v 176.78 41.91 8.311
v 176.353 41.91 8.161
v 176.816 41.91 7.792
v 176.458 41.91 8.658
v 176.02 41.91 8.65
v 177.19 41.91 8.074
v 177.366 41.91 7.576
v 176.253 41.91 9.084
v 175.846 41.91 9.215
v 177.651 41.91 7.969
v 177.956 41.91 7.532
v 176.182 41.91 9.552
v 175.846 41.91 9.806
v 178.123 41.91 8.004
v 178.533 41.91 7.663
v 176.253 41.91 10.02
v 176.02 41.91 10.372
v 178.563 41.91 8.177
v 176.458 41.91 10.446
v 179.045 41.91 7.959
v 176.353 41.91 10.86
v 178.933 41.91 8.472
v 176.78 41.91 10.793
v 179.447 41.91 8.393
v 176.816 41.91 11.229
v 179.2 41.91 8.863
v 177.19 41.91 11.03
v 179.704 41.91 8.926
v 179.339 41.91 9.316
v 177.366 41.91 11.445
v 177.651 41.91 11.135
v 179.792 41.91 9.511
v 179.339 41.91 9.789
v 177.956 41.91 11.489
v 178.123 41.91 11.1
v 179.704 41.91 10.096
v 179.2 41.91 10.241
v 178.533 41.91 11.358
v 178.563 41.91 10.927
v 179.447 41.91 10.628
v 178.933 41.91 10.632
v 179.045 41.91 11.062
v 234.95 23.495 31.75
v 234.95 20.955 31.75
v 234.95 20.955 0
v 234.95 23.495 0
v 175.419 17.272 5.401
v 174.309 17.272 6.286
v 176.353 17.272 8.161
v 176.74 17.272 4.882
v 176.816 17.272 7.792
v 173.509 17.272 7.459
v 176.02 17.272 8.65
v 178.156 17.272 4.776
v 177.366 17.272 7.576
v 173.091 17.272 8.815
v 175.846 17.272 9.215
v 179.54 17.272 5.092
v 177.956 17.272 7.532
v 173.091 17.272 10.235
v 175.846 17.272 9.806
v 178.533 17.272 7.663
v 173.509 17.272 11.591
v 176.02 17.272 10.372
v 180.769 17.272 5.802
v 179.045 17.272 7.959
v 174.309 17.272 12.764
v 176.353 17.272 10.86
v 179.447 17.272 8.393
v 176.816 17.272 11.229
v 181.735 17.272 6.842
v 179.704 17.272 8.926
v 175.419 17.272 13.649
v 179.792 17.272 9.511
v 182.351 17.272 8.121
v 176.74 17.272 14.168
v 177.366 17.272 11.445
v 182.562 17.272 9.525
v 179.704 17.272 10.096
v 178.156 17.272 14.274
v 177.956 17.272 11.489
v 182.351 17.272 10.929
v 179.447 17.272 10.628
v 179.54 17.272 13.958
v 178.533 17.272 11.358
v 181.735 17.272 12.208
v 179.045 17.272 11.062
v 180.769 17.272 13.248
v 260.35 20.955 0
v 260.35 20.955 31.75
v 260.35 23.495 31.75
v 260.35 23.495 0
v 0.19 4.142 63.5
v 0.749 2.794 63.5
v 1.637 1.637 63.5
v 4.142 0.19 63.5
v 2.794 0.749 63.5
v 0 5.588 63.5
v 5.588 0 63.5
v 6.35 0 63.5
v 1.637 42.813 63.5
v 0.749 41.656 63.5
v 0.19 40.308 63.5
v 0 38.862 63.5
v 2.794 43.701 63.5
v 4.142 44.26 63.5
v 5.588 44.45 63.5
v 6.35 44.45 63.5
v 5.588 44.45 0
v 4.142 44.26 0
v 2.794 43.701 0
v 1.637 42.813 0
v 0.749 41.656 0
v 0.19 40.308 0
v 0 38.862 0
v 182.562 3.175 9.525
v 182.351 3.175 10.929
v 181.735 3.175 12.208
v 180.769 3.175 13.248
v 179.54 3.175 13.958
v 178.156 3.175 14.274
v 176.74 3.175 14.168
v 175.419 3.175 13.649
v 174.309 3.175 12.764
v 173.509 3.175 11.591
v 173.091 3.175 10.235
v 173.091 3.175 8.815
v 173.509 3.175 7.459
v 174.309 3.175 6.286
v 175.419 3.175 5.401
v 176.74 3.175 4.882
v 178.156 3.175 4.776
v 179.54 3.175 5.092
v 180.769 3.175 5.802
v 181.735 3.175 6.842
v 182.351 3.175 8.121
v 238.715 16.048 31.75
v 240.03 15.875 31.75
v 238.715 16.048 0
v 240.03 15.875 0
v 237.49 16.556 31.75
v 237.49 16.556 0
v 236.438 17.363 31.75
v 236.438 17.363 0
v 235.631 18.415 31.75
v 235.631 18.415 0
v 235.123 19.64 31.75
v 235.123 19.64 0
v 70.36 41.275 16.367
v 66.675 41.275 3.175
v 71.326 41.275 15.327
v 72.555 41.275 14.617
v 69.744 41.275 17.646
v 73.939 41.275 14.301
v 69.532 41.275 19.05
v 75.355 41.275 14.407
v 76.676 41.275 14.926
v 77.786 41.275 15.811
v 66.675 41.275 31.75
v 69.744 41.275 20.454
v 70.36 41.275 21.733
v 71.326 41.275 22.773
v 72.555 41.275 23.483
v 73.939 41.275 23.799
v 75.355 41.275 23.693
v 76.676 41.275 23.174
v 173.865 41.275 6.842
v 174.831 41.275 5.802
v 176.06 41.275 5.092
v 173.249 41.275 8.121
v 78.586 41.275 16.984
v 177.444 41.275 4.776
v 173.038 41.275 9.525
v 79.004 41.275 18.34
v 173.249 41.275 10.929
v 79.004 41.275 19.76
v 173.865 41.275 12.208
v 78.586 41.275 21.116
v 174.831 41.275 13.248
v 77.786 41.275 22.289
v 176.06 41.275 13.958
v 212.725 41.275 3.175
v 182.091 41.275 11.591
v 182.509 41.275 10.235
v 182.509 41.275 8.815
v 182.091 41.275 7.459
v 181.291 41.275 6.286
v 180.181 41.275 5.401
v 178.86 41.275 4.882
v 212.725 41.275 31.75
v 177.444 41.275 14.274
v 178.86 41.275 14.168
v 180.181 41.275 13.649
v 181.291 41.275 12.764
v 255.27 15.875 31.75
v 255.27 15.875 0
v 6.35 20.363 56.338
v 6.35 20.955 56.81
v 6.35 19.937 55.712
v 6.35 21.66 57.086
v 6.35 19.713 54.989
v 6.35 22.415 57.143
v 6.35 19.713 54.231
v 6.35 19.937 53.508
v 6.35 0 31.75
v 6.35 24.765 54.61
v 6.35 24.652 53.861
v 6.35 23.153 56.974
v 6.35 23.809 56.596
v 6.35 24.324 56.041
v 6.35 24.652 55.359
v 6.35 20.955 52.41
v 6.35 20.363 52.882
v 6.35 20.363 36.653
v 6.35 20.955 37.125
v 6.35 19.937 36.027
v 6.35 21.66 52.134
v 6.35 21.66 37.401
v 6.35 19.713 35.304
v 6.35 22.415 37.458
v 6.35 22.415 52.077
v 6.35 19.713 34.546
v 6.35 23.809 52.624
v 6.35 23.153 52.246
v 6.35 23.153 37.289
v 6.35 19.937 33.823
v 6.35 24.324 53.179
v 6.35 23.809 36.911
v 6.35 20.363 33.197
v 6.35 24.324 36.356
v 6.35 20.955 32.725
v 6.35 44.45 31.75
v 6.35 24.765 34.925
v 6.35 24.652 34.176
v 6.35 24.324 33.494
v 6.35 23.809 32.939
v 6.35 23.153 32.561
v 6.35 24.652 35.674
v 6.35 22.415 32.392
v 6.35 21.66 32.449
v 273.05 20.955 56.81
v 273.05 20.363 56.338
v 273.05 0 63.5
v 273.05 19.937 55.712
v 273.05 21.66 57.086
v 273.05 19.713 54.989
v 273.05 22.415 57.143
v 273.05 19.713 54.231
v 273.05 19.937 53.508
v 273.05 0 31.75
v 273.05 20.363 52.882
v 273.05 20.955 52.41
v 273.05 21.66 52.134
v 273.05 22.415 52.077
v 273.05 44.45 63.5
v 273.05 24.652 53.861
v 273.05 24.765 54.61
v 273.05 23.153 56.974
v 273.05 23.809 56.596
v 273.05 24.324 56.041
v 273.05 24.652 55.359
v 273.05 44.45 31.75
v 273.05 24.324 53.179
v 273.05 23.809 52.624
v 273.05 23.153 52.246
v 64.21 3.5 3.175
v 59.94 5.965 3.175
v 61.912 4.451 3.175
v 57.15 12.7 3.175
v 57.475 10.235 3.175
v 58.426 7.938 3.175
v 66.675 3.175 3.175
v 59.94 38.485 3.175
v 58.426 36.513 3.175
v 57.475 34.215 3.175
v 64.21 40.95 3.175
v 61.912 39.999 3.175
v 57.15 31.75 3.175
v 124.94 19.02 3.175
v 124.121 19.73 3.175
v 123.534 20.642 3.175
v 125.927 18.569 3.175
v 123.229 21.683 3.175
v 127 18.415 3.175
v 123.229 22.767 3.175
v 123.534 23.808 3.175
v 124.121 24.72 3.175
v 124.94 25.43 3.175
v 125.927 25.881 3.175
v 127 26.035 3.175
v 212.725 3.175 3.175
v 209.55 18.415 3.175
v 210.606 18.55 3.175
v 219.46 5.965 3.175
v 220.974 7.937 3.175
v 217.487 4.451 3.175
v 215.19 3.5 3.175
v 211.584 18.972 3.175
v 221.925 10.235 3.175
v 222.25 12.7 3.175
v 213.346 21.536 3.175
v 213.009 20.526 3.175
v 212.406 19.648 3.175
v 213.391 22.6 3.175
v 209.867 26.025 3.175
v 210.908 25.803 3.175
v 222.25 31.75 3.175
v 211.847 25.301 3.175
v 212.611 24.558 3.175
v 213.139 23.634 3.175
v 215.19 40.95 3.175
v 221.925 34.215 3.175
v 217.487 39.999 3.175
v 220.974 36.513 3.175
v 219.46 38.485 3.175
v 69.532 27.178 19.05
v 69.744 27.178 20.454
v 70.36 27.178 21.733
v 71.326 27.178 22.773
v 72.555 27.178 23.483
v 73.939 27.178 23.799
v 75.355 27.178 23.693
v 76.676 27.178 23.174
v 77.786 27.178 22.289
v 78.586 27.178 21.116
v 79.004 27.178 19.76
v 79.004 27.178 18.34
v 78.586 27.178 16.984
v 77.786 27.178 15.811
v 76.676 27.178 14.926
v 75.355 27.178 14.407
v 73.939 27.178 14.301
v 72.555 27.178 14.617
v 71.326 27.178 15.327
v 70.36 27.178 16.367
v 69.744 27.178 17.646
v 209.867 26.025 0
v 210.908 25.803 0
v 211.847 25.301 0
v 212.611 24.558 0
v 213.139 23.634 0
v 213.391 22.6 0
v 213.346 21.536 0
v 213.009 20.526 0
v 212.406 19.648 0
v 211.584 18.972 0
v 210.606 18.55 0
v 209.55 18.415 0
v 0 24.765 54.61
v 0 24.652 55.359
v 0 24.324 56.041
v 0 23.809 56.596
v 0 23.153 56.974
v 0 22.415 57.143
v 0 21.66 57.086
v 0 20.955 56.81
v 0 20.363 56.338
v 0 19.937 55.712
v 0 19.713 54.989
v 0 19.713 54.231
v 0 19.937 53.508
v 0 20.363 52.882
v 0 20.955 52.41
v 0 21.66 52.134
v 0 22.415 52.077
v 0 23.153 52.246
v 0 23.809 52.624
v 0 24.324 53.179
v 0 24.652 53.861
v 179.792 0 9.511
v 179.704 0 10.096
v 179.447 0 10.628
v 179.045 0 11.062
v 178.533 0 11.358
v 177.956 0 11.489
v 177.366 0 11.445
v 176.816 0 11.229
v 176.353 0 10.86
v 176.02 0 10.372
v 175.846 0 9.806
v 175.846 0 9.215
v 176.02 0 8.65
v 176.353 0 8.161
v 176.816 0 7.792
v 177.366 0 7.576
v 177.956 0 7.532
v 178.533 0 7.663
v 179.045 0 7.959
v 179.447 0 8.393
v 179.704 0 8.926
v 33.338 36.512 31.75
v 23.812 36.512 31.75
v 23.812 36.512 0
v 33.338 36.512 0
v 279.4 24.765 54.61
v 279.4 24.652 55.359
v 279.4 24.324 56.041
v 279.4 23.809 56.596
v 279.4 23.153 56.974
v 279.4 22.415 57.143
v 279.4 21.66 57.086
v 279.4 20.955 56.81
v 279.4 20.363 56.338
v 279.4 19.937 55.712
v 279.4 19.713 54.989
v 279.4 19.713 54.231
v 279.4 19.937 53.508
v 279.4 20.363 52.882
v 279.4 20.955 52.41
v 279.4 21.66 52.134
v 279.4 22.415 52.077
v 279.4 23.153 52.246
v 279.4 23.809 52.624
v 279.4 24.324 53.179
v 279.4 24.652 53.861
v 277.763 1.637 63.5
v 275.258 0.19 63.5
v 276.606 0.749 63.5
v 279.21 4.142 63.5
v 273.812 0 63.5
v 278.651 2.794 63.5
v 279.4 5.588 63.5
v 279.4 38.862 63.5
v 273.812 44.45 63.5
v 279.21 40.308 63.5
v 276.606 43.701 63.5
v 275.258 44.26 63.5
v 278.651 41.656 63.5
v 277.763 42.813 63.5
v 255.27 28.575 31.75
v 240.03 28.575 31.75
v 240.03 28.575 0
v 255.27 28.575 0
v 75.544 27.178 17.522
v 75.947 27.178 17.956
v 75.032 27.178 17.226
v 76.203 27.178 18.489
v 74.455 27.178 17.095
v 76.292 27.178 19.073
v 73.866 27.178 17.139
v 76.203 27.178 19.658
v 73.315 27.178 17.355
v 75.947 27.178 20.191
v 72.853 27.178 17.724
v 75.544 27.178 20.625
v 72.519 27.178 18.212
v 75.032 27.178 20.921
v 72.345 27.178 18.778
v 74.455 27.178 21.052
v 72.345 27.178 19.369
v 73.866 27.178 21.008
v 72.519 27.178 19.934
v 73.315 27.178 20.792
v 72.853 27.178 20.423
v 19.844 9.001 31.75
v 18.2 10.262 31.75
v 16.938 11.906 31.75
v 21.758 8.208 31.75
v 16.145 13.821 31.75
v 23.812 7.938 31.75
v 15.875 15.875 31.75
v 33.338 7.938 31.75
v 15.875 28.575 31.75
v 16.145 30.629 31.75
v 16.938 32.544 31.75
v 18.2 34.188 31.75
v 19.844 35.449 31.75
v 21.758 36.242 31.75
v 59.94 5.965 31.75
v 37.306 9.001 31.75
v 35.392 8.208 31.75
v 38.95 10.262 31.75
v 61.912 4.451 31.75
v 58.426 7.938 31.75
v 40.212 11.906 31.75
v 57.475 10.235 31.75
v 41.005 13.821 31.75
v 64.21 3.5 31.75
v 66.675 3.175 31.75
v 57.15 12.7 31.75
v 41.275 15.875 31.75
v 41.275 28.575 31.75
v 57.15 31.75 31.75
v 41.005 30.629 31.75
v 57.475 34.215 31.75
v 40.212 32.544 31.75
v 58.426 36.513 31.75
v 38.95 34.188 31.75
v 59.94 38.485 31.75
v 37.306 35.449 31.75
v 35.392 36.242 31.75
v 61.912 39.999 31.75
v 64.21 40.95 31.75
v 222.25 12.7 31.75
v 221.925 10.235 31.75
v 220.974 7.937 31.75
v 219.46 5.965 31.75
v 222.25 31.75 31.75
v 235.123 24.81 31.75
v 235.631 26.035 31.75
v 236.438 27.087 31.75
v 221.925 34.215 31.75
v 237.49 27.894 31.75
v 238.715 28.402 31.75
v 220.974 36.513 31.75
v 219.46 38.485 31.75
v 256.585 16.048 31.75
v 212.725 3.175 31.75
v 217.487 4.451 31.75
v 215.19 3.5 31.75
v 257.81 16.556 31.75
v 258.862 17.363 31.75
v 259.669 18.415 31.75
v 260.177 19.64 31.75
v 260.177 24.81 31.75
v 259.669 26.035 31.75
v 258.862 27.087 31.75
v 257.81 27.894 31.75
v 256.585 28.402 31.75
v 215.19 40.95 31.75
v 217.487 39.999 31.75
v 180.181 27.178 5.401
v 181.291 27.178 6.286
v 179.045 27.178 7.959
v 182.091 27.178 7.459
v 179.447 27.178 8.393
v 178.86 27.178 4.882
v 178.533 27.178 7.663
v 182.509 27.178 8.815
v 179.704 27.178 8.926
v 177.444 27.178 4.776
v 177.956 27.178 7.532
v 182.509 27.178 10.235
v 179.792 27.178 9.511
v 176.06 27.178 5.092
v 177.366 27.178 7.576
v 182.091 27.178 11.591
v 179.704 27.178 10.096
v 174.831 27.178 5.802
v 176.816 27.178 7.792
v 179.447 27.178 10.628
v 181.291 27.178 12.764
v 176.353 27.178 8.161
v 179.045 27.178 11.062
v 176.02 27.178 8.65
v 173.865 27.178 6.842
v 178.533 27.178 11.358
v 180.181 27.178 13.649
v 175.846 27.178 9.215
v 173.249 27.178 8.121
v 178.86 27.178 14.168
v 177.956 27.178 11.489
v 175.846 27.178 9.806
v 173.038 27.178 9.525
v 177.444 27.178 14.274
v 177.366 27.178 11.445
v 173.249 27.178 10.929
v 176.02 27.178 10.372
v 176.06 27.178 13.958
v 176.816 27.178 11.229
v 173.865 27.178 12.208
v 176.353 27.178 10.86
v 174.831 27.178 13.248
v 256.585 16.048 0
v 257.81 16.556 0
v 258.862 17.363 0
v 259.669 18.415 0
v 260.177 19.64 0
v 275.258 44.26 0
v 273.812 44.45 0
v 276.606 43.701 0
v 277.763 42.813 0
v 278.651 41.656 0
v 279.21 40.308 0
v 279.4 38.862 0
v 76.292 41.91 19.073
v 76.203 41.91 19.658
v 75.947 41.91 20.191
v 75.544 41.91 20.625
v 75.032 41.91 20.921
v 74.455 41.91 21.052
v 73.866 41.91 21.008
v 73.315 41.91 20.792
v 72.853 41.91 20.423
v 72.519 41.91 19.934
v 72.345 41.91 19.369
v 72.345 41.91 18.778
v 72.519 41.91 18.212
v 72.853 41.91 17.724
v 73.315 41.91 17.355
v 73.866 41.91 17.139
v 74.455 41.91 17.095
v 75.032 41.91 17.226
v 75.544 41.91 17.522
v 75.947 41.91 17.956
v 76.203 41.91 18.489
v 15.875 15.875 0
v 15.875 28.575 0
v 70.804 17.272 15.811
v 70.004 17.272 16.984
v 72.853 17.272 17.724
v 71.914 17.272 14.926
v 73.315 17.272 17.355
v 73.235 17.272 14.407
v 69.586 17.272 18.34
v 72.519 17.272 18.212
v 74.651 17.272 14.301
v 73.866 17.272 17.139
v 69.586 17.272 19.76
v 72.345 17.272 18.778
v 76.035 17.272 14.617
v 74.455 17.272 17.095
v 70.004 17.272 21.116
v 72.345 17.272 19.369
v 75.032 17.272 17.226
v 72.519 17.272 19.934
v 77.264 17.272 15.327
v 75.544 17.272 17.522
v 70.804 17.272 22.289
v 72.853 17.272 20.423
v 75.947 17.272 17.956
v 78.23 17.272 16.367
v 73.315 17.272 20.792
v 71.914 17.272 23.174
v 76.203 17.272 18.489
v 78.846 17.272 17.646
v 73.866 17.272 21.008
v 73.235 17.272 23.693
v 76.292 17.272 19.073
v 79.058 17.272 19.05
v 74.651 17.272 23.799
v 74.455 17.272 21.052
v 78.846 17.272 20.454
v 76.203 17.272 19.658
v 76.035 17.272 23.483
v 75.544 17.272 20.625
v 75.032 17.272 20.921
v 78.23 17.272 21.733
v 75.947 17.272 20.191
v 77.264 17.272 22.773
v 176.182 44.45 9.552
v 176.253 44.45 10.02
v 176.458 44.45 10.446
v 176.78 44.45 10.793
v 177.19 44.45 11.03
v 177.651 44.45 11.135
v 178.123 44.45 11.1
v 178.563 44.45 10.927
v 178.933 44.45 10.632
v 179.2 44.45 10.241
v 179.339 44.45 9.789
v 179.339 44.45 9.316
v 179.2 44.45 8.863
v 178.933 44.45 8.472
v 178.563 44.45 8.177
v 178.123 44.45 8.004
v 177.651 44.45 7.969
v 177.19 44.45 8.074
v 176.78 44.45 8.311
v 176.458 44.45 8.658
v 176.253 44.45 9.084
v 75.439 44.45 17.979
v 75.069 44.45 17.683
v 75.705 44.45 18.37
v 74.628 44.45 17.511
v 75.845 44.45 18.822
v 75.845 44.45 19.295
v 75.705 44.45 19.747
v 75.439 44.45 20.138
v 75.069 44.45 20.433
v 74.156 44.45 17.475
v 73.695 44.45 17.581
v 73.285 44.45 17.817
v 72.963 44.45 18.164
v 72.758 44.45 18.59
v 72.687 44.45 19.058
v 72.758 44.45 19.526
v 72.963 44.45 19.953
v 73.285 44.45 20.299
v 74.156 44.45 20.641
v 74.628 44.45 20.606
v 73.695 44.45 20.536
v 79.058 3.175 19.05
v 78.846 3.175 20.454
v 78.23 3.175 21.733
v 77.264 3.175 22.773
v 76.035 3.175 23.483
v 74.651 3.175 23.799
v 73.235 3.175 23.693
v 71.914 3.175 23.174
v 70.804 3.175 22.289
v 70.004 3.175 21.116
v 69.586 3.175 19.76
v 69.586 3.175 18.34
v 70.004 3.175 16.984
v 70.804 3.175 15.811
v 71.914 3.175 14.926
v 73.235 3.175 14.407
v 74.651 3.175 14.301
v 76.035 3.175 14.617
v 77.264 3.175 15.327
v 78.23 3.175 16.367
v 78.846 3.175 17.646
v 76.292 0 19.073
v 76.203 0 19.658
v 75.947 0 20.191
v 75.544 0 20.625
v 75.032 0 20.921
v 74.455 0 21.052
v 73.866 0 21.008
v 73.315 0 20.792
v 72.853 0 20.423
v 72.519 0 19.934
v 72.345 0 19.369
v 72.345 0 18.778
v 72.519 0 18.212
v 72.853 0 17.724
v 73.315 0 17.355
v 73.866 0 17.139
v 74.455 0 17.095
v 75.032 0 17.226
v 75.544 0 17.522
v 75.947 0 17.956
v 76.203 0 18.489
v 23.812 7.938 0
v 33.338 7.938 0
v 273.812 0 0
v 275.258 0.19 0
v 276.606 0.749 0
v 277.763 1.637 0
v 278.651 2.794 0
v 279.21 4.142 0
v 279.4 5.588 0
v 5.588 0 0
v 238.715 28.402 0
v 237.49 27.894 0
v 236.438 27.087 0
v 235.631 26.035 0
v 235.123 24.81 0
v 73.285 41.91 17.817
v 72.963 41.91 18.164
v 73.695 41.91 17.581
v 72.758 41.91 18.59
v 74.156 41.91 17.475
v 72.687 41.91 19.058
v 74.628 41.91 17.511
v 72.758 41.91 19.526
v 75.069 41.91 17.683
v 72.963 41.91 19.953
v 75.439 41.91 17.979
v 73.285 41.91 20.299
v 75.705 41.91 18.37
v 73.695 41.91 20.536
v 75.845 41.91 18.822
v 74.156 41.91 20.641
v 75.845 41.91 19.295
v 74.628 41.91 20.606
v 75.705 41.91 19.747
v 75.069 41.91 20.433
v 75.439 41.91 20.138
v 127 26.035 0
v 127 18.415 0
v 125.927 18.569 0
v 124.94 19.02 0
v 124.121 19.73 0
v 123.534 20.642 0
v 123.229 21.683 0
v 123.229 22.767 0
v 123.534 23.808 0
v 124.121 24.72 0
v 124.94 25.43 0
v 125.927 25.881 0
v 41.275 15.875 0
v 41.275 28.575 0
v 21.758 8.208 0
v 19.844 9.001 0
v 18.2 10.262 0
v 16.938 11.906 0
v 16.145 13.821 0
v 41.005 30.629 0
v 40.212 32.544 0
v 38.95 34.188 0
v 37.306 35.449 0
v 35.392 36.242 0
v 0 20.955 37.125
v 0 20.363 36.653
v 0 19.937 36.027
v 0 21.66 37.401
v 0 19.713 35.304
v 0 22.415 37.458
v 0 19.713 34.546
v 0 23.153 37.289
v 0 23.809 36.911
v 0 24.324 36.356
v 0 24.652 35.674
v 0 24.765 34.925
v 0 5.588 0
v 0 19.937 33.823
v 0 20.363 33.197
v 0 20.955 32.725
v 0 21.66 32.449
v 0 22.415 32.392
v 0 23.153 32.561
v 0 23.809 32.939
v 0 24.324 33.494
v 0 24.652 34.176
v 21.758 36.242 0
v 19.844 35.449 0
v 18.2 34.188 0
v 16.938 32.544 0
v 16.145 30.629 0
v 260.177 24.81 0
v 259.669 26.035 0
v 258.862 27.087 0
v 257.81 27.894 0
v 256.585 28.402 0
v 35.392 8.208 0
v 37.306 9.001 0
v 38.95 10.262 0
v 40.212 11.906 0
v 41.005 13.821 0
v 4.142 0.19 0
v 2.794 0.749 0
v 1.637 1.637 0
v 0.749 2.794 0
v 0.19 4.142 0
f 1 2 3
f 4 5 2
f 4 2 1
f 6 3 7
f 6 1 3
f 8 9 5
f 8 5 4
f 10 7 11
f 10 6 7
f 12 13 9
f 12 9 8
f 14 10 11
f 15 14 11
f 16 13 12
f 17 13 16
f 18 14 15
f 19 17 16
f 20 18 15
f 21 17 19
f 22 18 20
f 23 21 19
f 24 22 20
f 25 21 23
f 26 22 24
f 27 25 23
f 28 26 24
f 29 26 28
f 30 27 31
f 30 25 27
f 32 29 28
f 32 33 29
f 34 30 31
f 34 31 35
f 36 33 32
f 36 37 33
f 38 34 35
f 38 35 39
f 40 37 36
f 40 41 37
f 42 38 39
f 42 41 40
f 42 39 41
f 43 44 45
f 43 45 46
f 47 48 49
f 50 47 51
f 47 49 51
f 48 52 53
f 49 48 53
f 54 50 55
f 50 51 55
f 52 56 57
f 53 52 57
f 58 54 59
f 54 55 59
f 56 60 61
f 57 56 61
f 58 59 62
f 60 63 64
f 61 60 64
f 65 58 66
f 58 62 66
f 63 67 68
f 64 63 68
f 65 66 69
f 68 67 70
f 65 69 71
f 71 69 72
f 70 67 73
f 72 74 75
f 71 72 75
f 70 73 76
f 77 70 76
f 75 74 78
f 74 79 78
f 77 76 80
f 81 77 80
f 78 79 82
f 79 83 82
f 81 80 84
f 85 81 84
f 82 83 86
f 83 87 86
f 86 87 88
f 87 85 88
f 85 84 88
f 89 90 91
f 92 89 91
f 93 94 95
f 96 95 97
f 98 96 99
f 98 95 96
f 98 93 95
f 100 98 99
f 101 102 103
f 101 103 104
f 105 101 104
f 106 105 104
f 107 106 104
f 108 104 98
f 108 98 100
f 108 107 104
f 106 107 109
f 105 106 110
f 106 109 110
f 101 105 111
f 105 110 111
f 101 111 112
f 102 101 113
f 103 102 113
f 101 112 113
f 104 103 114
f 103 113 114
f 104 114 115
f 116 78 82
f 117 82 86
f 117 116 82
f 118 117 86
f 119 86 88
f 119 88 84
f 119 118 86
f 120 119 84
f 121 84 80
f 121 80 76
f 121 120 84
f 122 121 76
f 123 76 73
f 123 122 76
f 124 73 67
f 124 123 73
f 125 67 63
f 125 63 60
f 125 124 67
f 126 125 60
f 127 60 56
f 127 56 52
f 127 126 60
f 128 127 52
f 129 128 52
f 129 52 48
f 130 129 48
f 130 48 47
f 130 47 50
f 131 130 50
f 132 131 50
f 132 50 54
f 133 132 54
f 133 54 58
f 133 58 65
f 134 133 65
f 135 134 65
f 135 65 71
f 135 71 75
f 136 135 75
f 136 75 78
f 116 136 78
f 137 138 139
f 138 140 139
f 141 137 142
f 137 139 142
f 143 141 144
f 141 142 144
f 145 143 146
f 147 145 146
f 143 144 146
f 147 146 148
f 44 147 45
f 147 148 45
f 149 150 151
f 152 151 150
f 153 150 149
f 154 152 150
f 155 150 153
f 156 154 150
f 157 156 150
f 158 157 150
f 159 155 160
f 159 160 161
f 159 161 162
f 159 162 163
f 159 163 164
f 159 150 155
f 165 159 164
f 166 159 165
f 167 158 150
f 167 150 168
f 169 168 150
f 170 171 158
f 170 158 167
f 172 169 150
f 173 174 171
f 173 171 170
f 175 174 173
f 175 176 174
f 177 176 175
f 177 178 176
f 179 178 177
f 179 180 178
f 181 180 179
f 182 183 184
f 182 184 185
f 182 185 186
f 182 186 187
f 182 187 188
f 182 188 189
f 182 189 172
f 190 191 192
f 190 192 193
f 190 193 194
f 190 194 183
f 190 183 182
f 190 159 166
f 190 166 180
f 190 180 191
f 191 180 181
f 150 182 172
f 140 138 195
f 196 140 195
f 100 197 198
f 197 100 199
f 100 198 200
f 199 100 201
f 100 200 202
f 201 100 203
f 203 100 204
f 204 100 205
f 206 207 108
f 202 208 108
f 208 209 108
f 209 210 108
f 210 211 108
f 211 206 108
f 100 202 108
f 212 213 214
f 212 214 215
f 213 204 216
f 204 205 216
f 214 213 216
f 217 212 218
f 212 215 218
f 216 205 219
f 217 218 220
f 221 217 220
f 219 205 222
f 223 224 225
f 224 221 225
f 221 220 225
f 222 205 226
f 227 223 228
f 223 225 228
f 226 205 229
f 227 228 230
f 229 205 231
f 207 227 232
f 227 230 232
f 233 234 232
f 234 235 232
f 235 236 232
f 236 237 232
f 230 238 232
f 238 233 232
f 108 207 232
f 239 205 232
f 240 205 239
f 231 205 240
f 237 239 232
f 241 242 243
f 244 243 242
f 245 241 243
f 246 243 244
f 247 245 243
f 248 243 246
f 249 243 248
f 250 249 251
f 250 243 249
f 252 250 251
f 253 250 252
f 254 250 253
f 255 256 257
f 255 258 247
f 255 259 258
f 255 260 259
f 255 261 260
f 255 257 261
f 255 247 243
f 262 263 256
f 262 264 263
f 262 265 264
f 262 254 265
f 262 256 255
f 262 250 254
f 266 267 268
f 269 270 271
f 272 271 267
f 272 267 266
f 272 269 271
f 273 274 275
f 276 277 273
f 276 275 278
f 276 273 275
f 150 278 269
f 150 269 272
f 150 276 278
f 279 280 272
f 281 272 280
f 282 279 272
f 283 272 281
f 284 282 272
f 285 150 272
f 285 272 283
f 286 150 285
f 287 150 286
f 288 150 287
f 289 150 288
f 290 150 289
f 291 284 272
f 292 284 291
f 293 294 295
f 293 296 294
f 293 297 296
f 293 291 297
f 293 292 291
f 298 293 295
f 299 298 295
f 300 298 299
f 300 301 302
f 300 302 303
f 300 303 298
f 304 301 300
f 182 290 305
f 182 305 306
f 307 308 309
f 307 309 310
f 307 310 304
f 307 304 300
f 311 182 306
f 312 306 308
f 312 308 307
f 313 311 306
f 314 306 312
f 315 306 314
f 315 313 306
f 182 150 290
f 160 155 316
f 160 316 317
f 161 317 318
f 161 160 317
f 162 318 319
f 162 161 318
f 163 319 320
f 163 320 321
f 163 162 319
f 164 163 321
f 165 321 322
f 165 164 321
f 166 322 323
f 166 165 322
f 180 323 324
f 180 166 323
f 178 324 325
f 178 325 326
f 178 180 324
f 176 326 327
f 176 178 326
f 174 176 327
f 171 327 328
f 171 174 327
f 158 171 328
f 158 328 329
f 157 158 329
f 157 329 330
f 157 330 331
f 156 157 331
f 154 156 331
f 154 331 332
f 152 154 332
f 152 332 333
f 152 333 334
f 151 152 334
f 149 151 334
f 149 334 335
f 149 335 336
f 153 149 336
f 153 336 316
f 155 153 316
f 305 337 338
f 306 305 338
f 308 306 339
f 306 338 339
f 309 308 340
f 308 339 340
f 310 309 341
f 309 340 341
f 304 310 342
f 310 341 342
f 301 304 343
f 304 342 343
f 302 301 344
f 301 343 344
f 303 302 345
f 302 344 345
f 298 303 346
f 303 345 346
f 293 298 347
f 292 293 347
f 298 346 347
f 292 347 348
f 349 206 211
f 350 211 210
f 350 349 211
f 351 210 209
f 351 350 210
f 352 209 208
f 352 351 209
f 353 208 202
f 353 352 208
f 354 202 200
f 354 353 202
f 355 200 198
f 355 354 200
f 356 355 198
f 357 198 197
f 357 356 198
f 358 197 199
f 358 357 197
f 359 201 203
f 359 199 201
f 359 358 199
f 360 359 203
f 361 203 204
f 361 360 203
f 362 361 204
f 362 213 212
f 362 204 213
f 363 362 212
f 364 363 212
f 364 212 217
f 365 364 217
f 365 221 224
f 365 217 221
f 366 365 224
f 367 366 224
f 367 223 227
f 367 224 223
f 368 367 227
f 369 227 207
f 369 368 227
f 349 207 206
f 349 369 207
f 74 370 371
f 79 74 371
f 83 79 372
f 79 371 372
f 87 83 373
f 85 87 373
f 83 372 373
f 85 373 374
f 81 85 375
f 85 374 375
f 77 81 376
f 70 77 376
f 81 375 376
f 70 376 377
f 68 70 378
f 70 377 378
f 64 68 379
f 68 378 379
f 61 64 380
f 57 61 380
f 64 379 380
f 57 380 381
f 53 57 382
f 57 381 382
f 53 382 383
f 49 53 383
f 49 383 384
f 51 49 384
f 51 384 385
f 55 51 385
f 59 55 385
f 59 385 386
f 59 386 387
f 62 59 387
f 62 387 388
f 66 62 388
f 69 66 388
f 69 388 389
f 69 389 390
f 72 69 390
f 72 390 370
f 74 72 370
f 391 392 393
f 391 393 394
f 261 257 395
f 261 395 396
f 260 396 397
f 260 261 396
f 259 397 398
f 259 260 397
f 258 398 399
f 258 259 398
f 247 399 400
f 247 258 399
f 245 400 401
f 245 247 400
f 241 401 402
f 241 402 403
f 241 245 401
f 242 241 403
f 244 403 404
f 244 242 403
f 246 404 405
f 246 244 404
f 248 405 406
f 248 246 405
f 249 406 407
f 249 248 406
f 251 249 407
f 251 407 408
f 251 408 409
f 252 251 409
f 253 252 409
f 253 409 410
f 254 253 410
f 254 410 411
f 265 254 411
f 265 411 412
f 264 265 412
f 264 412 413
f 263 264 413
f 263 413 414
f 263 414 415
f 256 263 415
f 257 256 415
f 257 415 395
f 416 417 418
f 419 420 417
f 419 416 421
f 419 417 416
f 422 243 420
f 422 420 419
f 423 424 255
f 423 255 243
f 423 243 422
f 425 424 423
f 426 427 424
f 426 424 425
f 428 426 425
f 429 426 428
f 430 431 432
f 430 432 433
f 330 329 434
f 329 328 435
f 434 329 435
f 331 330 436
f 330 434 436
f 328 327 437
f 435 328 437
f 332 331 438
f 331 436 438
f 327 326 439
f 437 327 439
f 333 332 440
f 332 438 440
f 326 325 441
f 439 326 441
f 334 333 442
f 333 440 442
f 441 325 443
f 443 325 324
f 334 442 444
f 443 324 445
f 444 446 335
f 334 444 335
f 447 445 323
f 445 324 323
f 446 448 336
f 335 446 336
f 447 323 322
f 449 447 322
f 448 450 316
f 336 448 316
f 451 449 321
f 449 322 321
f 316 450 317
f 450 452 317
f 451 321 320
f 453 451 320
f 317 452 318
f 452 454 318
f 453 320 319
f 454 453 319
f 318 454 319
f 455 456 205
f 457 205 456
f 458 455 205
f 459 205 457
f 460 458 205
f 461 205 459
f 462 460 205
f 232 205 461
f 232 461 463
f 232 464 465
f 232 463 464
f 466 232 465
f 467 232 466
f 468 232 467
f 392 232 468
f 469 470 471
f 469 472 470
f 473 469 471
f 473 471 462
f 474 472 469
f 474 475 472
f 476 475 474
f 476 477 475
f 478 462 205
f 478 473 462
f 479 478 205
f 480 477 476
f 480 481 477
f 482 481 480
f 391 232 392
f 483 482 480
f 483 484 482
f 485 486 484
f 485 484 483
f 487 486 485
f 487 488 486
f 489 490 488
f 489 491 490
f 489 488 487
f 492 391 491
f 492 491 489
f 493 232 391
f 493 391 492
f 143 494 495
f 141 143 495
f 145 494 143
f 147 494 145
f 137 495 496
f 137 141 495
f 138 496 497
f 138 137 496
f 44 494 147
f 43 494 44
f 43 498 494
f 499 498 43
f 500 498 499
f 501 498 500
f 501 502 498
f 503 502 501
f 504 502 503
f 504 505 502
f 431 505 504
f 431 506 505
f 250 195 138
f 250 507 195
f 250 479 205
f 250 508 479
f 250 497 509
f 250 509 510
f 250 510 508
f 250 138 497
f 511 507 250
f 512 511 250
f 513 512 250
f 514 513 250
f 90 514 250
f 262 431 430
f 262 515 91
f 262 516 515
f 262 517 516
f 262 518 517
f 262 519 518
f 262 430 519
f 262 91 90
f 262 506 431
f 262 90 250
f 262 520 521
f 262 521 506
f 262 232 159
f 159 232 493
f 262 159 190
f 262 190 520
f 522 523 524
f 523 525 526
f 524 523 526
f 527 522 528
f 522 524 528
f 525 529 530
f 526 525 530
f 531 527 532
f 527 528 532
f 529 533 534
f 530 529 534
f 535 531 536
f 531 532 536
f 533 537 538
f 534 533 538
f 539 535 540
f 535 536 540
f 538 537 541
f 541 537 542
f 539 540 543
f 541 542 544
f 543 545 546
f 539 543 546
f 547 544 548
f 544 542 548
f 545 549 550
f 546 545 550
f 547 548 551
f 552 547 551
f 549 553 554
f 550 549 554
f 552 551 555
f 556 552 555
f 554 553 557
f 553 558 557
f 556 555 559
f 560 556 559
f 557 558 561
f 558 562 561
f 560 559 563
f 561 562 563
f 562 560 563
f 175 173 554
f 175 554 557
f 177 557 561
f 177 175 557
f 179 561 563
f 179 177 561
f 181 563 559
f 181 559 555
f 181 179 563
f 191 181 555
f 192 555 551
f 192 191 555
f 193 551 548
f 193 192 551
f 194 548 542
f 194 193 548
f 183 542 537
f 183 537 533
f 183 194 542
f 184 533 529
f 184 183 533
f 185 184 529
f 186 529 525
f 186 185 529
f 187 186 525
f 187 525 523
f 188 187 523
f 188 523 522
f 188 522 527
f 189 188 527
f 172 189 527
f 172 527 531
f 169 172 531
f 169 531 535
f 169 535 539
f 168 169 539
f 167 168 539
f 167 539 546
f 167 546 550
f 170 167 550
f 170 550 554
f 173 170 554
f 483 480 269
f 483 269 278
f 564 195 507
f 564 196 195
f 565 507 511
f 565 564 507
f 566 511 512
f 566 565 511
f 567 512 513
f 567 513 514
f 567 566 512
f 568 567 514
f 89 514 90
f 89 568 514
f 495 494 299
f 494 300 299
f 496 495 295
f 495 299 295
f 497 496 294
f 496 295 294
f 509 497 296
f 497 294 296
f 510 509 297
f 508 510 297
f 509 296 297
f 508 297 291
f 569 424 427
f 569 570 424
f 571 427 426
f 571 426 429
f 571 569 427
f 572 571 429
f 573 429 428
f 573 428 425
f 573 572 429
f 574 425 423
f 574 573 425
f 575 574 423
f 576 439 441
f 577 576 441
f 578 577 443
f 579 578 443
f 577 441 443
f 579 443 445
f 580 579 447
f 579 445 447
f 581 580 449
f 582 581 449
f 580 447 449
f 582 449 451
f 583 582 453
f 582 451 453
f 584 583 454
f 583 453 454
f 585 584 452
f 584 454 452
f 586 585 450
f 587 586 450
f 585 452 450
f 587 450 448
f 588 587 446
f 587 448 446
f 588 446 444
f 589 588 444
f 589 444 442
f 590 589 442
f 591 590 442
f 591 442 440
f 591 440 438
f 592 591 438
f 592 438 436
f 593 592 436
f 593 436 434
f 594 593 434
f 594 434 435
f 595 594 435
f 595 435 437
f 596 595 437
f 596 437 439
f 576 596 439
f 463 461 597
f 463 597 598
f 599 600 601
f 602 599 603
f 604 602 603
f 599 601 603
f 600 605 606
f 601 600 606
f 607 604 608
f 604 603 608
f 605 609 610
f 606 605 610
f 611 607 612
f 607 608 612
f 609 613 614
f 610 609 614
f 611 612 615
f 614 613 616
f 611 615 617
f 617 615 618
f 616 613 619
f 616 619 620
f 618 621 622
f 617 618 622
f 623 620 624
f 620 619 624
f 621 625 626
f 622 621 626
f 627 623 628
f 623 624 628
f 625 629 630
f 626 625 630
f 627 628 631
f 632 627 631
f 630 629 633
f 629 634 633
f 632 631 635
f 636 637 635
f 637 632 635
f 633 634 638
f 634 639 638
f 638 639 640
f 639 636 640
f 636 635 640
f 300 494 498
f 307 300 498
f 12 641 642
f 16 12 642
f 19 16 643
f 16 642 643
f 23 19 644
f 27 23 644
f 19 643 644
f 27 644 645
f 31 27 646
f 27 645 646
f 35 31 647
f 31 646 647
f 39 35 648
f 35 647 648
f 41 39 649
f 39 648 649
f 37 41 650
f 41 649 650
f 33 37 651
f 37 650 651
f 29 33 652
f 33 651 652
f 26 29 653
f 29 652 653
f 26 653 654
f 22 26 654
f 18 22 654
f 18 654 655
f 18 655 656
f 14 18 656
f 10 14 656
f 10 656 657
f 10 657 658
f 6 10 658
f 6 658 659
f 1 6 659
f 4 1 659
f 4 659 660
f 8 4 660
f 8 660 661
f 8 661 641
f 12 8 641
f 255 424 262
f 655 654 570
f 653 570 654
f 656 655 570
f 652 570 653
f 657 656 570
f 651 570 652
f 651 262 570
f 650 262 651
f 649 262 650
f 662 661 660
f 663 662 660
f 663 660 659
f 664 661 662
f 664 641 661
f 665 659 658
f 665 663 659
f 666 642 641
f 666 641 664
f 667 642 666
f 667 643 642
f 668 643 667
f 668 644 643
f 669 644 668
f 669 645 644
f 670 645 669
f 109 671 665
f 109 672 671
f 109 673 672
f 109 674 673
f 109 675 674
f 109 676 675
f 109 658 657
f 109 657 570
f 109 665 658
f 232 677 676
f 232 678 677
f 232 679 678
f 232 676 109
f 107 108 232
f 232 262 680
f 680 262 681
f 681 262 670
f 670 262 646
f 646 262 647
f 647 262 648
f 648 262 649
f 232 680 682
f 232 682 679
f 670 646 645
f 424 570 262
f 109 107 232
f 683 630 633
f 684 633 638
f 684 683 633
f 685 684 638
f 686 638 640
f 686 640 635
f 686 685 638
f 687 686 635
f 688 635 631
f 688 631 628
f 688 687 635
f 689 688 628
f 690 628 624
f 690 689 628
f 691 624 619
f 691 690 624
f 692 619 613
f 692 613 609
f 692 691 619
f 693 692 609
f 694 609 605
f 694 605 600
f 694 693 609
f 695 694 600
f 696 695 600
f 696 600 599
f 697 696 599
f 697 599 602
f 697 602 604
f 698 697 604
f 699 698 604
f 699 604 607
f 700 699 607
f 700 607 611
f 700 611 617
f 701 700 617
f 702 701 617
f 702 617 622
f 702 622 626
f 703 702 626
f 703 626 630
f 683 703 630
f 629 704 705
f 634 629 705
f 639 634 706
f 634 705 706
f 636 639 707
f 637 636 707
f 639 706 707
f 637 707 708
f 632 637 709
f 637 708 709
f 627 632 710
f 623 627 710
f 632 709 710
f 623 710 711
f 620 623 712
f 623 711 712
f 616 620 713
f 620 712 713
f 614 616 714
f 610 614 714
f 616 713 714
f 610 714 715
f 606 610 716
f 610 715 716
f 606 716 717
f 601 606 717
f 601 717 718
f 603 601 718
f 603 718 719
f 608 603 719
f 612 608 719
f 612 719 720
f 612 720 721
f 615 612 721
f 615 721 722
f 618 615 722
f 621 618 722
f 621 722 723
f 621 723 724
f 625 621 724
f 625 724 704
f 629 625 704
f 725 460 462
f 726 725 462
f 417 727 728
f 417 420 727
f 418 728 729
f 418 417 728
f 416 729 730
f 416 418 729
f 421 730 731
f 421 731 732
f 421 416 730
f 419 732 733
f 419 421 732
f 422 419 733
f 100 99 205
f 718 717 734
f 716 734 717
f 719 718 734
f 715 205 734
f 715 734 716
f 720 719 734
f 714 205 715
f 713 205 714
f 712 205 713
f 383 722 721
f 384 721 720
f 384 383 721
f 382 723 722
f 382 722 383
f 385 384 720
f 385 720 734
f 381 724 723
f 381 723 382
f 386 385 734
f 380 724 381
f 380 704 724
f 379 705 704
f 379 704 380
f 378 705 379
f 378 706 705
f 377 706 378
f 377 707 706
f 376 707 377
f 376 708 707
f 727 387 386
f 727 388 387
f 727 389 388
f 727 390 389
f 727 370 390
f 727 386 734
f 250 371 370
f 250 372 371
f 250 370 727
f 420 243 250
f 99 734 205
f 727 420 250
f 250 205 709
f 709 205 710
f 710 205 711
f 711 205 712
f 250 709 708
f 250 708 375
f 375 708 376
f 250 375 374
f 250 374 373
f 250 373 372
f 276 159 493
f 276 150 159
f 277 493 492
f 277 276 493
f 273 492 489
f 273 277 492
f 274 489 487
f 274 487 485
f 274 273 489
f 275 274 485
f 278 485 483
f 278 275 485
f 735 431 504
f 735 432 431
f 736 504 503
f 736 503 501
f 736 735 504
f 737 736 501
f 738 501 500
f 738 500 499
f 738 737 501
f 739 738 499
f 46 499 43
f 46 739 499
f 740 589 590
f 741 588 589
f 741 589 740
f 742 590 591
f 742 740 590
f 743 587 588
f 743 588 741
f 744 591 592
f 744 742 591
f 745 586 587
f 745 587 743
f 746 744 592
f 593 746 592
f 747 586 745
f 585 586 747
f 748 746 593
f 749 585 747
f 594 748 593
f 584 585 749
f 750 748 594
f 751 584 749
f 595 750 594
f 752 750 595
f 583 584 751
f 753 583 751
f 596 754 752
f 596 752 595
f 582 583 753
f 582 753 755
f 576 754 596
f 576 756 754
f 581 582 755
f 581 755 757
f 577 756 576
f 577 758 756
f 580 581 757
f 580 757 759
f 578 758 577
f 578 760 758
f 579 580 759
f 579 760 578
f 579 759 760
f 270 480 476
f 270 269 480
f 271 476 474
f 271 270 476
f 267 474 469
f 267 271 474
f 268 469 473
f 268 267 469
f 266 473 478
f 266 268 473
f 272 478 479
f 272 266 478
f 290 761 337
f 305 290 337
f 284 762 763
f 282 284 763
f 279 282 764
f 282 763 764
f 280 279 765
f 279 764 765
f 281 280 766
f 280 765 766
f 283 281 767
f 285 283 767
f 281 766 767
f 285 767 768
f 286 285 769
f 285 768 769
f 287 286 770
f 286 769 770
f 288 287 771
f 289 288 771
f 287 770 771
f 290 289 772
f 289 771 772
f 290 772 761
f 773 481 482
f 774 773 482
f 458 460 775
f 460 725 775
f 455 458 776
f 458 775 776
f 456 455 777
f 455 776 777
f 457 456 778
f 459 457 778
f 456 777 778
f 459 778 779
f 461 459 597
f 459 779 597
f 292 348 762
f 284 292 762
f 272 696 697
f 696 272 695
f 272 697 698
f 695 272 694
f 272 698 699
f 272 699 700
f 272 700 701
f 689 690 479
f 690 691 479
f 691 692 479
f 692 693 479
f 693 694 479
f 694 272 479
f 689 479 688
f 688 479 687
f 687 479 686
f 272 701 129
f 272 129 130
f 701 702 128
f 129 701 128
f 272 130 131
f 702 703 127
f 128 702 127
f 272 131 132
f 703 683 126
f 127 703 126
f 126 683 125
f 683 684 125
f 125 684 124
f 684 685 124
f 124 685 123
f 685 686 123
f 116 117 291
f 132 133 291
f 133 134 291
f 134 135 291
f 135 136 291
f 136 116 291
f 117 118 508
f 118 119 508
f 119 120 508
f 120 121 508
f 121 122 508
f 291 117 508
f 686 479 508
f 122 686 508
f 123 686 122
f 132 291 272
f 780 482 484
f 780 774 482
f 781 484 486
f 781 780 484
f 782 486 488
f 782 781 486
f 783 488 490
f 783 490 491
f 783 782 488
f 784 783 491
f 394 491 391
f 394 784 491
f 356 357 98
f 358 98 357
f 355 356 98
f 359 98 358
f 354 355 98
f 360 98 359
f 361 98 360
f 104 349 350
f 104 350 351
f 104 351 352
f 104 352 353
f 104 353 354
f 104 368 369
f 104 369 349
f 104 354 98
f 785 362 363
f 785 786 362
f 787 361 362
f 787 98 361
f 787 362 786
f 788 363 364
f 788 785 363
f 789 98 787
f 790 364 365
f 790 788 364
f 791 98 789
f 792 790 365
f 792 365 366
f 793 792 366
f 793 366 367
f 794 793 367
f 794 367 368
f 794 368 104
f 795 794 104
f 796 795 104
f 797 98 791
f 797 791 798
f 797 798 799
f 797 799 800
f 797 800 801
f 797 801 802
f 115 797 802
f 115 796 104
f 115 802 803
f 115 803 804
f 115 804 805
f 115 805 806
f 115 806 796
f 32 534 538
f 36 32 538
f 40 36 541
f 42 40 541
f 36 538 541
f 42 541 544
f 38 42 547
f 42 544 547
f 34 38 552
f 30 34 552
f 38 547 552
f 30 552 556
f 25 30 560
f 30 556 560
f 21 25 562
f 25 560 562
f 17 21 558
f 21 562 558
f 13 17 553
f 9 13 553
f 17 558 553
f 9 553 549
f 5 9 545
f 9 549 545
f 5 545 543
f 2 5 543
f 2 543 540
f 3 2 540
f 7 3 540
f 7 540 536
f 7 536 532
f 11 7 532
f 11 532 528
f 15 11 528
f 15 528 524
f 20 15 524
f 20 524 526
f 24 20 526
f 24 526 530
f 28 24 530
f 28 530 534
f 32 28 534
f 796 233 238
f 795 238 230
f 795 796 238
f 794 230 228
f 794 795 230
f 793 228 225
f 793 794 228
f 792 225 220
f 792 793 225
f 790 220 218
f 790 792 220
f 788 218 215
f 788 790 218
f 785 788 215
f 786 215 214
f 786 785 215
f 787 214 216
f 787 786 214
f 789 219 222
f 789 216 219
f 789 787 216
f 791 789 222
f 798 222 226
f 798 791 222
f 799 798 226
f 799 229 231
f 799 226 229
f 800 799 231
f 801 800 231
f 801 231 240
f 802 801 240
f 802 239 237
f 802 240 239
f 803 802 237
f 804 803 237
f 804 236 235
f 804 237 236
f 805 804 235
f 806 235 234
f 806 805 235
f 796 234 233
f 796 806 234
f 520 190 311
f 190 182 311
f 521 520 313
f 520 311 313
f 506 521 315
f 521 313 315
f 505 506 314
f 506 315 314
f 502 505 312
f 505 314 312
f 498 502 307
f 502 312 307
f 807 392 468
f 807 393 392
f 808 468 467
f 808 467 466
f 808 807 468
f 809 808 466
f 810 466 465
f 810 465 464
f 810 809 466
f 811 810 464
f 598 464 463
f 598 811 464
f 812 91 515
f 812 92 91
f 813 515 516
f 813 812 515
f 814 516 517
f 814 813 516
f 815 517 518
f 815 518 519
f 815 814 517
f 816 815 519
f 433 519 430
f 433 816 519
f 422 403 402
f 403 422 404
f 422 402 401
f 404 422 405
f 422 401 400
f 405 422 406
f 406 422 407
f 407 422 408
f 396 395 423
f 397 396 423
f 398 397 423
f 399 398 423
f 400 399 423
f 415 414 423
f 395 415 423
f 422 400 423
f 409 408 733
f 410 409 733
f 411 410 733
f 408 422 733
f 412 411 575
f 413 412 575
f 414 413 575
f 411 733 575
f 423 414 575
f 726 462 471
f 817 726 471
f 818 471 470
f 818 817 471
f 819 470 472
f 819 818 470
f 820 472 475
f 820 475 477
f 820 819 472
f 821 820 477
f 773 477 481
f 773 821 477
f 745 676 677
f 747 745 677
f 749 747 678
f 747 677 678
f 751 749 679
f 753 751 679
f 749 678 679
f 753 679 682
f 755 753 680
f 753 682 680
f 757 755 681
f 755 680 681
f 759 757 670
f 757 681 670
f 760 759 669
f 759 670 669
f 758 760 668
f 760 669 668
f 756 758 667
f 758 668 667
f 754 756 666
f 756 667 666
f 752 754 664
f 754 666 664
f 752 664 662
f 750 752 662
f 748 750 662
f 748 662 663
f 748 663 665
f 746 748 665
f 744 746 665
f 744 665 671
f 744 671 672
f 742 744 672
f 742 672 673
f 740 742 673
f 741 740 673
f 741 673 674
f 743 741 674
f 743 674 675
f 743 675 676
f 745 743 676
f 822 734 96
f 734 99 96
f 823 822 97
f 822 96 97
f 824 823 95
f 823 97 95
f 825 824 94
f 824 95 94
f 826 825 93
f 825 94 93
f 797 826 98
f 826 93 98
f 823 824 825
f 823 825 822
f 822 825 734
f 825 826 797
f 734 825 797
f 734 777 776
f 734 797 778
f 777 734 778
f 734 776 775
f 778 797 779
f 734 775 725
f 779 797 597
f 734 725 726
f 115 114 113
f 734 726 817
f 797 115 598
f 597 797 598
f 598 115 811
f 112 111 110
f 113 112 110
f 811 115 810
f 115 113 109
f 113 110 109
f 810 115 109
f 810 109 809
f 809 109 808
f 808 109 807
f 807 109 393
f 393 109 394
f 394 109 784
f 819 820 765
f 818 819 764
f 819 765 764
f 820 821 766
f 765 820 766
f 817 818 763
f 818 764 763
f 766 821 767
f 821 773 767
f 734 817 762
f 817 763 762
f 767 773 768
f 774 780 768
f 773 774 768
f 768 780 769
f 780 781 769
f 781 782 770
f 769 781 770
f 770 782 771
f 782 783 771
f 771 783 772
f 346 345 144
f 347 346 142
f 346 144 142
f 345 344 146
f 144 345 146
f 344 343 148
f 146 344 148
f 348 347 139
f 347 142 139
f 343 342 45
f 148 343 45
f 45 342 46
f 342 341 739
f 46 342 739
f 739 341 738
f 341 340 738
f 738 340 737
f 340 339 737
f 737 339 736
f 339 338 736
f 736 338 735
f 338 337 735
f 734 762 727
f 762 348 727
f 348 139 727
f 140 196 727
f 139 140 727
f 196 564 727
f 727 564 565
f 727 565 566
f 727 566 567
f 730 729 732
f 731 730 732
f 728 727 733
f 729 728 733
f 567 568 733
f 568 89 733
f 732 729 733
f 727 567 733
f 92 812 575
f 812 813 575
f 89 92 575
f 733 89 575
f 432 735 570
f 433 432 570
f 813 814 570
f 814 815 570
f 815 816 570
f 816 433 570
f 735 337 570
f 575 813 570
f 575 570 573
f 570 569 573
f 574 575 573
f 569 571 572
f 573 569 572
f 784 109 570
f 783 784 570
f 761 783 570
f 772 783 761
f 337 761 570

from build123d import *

# Parameters (mm, degrees)
F0_W      = 279.4
F0_H      = 44.45
F1_DEPTH  = 31.75
F2_W      = 165.1
F2_H      = 38.1
F3_DEPTH  = 28.575
F5_DEPTH  = 31.751
F6_W      = 6.35
F6_H      = 44.45
F7_DEPTH  = 31.75
F8_R      = 9.525
F9_R      = 5.588
F10_R     = 2.54
F11_DEPTH = 279.4
F12_W     = 25.4
F12_H     = 28.575
F12_H_2   = 12.7
F13_DEPTH = 31.751
F14_R     = 2.54
F15_DEPTH = 7.62
F16_R     = 7.9375
F17_R     = 5.08
F18_R     = 4.7625
F19_DEPTH = 17.272
F20_R     = 4.7625
F21_DEPTH = 17.272
F22_R     = 1.984375
F23_DEPTH = 41.91
F24_R     = 1.5875
F25_DEPTH = 3.175


with BuildPart() as f1:
    # F0 (on Top) → F1 (new body)
    with BuildSketch(Plane.XY):
        with Locations((139.7, 22.225)):
            Rectangle(F0_W, F0_H)
    extrude(amount=F1_DEPTH)

    # F2 (on face) → F3 (cut)
    with BuildSketch(Plane.XY.offset(31.75)):
        with Locations((139.7, 22.225)):
            Rectangle(F2_W, F2_H)
    extrude(amount=-F3_DEPTH, mode=Mode.SUBTRACT)

    # F4 (on face) → F5 (cut, through all)
    with BuildSketch(Plane(origin=(0, 0, 0), x_dir=(1, 0, 0), z_dir=(0, 0, -1))):
        with BuildLine():
            Line((127, -26.035), (209.867099, -26.025243))
            ThreePointArc((209.867099, -26.025243), (213.405749, -22.066069), (209.55, -18.415))
            Line((209.55, -18.415), (127, -18.415))
            ThreePointArc((127, -18.415), (123.19, -22.225), (127, -26.035))
        make_face()
    extrude(amount=-F5_DEPTH, mode=Mode.SUBTRACT)

    # F6 (on face) → F7 (join)
    with BuildSketch(Plane.XY.offset(31.75)):
        with Locations((3.175, 22.225)):
            Rectangle(F6_W, F6_H)
        with Locations((276.225, 22.225)):
            Rectangle(F6_W, F6_H)
    extrude(amount=F7_DEPTH)

    # F8
    f8_edges = [f1.edges().sort_by_distance(p)[0] for p in [
        (57.15, 3.175, 17.4625),
        (57.15, 41.275, 17.4625),
        (222.25, 3.175, 17.4625),
        (222.25, 41.275, 17.4625),
    ]]
    fillet(f8_edges, radius=F8_R)

    # F9
    f9_edges = [f1.edges().sort_by_distance(p)[0] for p in [
        (0, 44.45, 31.75),
        (0, 0, 31.75),
        (279.4, 44.45, 31.75),
        (279.4, 0, 31.75),
    ]]
    fillet(f9_edges, radius=F9_R)

    # F10 (on Right) → F11 (cut)
    with BuildSketch(Plane.YZ):
        with Locations((22.225, 54.61)):
            Circle(F10_R)
    extrude(amount=F11_DEPTH, mode=Mode.SUBTRACT)

    # F12 (on face) → F13 (cut, through all)
    with BuildSketch(Plane.XY.offset(31.75)):
        with Locations((28.575, 22.225)):
            Rectangle(F12_W, F12_H)
        with Locations((247.65, 22.225)):
            Rectangle(F12_W, F12_H_2)
    extrude(amount=-F13_DEPTH, mode=Mode.SUBTRACT)

    # F14 (on Right) → F15 (cut)
    with BuildSketch(Plane.YZ):
        with Locations((22.225, 34.925)):
            Circle(F14_R)
    extrude(amount=F15_DEPTH, mode=Mode.SUBTRACT)

    # F16
    f16_edges = [f1.edges().sort_by_distance(p)[0] for p in [
        (15.875, 36.5125, 15.875),
        (41.275, 36.5125, 15.875),
        (41.275, 7.9375, 15.875),
        (15.875, 7.9375, 15.875),
    ]]
    fillet(f16_edges, radius=F16_R)

    # F17
    f17_edges = [f1.edges().sort_by_distance(p)[0] for p in [
        (234.95, 28.575, 15.875),
        (260.35, 28.575, 15.875),
        (260.35, 15.875, 15.875),
        (234.95, 15.875, 15.875),
    ]]
    fillet(f17_edges, radius=F17_R)

    # F18 (on face) → F19 (join)
    with BuildSketch(Plane.XZ):
        with Locations((177.8, 9.525)):
            Circle(F18_R)
        with Locations((74.295, 19.05)):
            Circle(F18_R)
    extrude(amount=-F19_DEPTH)

    # F20 (on face) → F21 (join)
    with BuildSketch(Plane(origin=(0, 44.45, 0), x_dir=(-1, 0, 0), z_dir=(0, 1, 0))):
        with Locations((-177.8, 9.525)):
            Circle(F20_R)
        with Locations((-74.295, 19.05)):
            Circle(F20_R)
    extrude(amount=-F21_DEPTH)

    # F22 (on face) → F23 (cut)
    with BuildSketch(Plane.XZ):
        with Locations((74.307166, 19.073443)):
            Circle(F22_R)
        with Locations((177.807808, 9.510602)):
            Circle(F22_R)
    extrude(amount=-F23_DEPTH, mode=Mode.SUBTRACT)

    # F24 (on face) → F25 (cut)
    with BuildSketch(Plane(origin=(0, 44.45, 0), x_dir=(-1, 0, 0), z_dir=(0, 1, 0))):
        with Locations((-177.769601, 9.552136)):
            Circle(F24_R)
        with Locations((-74.274786, 19.058295)):
            Circle(F24_R)
    extrude(amount=-F25_DEPTH, mode=Mode.SUBTRACT)


solid = f1.part
